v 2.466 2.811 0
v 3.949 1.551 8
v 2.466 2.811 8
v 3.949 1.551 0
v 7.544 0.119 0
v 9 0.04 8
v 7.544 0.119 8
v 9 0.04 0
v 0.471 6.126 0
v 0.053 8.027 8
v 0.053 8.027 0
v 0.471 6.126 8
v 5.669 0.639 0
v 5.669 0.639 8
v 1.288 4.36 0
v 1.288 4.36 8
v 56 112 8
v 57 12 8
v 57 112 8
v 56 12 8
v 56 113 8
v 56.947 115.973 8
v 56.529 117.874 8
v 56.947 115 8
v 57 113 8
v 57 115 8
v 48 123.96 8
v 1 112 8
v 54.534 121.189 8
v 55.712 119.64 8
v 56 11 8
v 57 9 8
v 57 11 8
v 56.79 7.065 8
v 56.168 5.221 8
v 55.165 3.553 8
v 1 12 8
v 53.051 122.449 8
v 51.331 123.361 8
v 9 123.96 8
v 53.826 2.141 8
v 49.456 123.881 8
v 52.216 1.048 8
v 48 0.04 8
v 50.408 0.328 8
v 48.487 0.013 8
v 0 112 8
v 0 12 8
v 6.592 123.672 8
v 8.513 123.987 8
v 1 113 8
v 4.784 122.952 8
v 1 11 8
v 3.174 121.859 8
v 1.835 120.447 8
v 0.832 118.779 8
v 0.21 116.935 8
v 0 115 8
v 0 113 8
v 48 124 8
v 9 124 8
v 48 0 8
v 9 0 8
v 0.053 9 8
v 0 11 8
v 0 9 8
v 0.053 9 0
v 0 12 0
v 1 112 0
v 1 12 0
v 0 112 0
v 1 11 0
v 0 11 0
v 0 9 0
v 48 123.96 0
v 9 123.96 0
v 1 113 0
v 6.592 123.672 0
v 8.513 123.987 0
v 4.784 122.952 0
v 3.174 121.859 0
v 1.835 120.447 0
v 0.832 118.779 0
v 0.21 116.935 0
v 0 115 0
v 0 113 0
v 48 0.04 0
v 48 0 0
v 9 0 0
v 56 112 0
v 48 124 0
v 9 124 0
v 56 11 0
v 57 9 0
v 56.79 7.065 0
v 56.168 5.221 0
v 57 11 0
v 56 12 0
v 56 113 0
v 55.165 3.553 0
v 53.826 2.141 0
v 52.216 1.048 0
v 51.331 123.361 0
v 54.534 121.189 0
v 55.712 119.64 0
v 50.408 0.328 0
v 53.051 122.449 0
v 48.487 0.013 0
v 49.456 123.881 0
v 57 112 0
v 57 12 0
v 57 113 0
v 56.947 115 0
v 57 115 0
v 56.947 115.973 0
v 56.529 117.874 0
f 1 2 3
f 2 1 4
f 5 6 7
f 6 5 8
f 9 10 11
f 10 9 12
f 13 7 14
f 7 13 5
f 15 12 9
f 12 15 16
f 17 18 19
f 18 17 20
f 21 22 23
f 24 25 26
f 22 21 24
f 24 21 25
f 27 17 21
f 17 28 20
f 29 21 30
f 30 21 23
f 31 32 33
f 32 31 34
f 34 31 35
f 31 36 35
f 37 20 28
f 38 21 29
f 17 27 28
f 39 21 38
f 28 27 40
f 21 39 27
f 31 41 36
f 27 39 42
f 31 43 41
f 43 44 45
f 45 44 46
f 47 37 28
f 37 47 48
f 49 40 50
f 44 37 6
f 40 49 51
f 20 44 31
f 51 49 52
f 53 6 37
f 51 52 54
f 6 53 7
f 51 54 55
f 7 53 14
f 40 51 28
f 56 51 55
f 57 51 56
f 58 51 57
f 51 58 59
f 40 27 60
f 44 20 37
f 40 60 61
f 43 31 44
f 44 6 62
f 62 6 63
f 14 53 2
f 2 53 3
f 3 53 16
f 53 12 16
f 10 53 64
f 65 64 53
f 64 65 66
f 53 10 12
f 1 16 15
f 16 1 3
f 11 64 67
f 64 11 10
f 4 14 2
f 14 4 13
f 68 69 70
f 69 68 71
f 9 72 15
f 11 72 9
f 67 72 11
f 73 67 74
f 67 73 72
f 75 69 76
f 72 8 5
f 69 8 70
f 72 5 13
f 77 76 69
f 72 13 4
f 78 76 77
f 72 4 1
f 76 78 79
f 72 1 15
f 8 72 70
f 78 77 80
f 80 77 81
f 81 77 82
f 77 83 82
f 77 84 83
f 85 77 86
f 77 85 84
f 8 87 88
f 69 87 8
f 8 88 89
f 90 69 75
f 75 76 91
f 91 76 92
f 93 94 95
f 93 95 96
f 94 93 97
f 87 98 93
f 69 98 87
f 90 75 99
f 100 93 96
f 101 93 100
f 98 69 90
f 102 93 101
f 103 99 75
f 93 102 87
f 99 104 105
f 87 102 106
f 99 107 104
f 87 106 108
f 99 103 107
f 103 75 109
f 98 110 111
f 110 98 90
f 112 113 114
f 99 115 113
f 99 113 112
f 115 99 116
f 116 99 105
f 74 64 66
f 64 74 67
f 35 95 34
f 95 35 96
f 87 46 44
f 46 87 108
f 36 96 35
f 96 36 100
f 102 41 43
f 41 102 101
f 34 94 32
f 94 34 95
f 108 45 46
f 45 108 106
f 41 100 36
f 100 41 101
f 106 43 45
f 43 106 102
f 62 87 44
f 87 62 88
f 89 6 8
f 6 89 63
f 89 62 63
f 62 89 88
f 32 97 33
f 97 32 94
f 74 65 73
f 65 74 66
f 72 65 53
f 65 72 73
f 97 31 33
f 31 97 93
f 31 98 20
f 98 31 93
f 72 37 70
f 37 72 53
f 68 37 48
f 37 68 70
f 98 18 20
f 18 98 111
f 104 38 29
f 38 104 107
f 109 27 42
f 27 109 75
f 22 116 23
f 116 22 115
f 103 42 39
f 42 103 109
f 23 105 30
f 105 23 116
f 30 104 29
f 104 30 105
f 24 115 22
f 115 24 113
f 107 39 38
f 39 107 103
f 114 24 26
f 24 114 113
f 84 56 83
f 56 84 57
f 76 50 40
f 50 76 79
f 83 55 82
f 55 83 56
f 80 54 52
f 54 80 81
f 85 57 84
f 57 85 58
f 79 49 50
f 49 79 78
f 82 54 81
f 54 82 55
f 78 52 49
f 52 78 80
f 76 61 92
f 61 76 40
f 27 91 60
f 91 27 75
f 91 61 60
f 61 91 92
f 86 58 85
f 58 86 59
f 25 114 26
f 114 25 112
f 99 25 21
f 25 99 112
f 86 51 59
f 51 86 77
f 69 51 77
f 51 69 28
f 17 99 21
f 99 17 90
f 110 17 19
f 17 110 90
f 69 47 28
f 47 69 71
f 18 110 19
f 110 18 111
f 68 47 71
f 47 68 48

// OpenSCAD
iW=57;
iH=124;
iL=8;
iC=9;

module iphone_center() {
    cube([57,100,iL]);
}

module corner() {
    difference() {
        cylinder(iL,r=iC);
        translate([-10,0,-1])
            cube([20,iC+1,20]);
    }
}
module iphone_top() {
    translate([iC,iC,0])
        corner();
    translate([iW-iC,iC,0])
        corner();
    translate([iC,0,0])
        cube([iW-iC-iC,iC,iL]);
    translate([0,iC,0])
        cube([iW,2,iL]);
    translate([1,11,0])
        cube([55,1,iL]);
}

module iphone() {
    translate([0,12,0])
        iphone_center();
    translate([0,0,0])
        iphone_top();
    translate([iW,iH,0])
        rotate([0,0,180])
            iphone_top();
}

iphone();
